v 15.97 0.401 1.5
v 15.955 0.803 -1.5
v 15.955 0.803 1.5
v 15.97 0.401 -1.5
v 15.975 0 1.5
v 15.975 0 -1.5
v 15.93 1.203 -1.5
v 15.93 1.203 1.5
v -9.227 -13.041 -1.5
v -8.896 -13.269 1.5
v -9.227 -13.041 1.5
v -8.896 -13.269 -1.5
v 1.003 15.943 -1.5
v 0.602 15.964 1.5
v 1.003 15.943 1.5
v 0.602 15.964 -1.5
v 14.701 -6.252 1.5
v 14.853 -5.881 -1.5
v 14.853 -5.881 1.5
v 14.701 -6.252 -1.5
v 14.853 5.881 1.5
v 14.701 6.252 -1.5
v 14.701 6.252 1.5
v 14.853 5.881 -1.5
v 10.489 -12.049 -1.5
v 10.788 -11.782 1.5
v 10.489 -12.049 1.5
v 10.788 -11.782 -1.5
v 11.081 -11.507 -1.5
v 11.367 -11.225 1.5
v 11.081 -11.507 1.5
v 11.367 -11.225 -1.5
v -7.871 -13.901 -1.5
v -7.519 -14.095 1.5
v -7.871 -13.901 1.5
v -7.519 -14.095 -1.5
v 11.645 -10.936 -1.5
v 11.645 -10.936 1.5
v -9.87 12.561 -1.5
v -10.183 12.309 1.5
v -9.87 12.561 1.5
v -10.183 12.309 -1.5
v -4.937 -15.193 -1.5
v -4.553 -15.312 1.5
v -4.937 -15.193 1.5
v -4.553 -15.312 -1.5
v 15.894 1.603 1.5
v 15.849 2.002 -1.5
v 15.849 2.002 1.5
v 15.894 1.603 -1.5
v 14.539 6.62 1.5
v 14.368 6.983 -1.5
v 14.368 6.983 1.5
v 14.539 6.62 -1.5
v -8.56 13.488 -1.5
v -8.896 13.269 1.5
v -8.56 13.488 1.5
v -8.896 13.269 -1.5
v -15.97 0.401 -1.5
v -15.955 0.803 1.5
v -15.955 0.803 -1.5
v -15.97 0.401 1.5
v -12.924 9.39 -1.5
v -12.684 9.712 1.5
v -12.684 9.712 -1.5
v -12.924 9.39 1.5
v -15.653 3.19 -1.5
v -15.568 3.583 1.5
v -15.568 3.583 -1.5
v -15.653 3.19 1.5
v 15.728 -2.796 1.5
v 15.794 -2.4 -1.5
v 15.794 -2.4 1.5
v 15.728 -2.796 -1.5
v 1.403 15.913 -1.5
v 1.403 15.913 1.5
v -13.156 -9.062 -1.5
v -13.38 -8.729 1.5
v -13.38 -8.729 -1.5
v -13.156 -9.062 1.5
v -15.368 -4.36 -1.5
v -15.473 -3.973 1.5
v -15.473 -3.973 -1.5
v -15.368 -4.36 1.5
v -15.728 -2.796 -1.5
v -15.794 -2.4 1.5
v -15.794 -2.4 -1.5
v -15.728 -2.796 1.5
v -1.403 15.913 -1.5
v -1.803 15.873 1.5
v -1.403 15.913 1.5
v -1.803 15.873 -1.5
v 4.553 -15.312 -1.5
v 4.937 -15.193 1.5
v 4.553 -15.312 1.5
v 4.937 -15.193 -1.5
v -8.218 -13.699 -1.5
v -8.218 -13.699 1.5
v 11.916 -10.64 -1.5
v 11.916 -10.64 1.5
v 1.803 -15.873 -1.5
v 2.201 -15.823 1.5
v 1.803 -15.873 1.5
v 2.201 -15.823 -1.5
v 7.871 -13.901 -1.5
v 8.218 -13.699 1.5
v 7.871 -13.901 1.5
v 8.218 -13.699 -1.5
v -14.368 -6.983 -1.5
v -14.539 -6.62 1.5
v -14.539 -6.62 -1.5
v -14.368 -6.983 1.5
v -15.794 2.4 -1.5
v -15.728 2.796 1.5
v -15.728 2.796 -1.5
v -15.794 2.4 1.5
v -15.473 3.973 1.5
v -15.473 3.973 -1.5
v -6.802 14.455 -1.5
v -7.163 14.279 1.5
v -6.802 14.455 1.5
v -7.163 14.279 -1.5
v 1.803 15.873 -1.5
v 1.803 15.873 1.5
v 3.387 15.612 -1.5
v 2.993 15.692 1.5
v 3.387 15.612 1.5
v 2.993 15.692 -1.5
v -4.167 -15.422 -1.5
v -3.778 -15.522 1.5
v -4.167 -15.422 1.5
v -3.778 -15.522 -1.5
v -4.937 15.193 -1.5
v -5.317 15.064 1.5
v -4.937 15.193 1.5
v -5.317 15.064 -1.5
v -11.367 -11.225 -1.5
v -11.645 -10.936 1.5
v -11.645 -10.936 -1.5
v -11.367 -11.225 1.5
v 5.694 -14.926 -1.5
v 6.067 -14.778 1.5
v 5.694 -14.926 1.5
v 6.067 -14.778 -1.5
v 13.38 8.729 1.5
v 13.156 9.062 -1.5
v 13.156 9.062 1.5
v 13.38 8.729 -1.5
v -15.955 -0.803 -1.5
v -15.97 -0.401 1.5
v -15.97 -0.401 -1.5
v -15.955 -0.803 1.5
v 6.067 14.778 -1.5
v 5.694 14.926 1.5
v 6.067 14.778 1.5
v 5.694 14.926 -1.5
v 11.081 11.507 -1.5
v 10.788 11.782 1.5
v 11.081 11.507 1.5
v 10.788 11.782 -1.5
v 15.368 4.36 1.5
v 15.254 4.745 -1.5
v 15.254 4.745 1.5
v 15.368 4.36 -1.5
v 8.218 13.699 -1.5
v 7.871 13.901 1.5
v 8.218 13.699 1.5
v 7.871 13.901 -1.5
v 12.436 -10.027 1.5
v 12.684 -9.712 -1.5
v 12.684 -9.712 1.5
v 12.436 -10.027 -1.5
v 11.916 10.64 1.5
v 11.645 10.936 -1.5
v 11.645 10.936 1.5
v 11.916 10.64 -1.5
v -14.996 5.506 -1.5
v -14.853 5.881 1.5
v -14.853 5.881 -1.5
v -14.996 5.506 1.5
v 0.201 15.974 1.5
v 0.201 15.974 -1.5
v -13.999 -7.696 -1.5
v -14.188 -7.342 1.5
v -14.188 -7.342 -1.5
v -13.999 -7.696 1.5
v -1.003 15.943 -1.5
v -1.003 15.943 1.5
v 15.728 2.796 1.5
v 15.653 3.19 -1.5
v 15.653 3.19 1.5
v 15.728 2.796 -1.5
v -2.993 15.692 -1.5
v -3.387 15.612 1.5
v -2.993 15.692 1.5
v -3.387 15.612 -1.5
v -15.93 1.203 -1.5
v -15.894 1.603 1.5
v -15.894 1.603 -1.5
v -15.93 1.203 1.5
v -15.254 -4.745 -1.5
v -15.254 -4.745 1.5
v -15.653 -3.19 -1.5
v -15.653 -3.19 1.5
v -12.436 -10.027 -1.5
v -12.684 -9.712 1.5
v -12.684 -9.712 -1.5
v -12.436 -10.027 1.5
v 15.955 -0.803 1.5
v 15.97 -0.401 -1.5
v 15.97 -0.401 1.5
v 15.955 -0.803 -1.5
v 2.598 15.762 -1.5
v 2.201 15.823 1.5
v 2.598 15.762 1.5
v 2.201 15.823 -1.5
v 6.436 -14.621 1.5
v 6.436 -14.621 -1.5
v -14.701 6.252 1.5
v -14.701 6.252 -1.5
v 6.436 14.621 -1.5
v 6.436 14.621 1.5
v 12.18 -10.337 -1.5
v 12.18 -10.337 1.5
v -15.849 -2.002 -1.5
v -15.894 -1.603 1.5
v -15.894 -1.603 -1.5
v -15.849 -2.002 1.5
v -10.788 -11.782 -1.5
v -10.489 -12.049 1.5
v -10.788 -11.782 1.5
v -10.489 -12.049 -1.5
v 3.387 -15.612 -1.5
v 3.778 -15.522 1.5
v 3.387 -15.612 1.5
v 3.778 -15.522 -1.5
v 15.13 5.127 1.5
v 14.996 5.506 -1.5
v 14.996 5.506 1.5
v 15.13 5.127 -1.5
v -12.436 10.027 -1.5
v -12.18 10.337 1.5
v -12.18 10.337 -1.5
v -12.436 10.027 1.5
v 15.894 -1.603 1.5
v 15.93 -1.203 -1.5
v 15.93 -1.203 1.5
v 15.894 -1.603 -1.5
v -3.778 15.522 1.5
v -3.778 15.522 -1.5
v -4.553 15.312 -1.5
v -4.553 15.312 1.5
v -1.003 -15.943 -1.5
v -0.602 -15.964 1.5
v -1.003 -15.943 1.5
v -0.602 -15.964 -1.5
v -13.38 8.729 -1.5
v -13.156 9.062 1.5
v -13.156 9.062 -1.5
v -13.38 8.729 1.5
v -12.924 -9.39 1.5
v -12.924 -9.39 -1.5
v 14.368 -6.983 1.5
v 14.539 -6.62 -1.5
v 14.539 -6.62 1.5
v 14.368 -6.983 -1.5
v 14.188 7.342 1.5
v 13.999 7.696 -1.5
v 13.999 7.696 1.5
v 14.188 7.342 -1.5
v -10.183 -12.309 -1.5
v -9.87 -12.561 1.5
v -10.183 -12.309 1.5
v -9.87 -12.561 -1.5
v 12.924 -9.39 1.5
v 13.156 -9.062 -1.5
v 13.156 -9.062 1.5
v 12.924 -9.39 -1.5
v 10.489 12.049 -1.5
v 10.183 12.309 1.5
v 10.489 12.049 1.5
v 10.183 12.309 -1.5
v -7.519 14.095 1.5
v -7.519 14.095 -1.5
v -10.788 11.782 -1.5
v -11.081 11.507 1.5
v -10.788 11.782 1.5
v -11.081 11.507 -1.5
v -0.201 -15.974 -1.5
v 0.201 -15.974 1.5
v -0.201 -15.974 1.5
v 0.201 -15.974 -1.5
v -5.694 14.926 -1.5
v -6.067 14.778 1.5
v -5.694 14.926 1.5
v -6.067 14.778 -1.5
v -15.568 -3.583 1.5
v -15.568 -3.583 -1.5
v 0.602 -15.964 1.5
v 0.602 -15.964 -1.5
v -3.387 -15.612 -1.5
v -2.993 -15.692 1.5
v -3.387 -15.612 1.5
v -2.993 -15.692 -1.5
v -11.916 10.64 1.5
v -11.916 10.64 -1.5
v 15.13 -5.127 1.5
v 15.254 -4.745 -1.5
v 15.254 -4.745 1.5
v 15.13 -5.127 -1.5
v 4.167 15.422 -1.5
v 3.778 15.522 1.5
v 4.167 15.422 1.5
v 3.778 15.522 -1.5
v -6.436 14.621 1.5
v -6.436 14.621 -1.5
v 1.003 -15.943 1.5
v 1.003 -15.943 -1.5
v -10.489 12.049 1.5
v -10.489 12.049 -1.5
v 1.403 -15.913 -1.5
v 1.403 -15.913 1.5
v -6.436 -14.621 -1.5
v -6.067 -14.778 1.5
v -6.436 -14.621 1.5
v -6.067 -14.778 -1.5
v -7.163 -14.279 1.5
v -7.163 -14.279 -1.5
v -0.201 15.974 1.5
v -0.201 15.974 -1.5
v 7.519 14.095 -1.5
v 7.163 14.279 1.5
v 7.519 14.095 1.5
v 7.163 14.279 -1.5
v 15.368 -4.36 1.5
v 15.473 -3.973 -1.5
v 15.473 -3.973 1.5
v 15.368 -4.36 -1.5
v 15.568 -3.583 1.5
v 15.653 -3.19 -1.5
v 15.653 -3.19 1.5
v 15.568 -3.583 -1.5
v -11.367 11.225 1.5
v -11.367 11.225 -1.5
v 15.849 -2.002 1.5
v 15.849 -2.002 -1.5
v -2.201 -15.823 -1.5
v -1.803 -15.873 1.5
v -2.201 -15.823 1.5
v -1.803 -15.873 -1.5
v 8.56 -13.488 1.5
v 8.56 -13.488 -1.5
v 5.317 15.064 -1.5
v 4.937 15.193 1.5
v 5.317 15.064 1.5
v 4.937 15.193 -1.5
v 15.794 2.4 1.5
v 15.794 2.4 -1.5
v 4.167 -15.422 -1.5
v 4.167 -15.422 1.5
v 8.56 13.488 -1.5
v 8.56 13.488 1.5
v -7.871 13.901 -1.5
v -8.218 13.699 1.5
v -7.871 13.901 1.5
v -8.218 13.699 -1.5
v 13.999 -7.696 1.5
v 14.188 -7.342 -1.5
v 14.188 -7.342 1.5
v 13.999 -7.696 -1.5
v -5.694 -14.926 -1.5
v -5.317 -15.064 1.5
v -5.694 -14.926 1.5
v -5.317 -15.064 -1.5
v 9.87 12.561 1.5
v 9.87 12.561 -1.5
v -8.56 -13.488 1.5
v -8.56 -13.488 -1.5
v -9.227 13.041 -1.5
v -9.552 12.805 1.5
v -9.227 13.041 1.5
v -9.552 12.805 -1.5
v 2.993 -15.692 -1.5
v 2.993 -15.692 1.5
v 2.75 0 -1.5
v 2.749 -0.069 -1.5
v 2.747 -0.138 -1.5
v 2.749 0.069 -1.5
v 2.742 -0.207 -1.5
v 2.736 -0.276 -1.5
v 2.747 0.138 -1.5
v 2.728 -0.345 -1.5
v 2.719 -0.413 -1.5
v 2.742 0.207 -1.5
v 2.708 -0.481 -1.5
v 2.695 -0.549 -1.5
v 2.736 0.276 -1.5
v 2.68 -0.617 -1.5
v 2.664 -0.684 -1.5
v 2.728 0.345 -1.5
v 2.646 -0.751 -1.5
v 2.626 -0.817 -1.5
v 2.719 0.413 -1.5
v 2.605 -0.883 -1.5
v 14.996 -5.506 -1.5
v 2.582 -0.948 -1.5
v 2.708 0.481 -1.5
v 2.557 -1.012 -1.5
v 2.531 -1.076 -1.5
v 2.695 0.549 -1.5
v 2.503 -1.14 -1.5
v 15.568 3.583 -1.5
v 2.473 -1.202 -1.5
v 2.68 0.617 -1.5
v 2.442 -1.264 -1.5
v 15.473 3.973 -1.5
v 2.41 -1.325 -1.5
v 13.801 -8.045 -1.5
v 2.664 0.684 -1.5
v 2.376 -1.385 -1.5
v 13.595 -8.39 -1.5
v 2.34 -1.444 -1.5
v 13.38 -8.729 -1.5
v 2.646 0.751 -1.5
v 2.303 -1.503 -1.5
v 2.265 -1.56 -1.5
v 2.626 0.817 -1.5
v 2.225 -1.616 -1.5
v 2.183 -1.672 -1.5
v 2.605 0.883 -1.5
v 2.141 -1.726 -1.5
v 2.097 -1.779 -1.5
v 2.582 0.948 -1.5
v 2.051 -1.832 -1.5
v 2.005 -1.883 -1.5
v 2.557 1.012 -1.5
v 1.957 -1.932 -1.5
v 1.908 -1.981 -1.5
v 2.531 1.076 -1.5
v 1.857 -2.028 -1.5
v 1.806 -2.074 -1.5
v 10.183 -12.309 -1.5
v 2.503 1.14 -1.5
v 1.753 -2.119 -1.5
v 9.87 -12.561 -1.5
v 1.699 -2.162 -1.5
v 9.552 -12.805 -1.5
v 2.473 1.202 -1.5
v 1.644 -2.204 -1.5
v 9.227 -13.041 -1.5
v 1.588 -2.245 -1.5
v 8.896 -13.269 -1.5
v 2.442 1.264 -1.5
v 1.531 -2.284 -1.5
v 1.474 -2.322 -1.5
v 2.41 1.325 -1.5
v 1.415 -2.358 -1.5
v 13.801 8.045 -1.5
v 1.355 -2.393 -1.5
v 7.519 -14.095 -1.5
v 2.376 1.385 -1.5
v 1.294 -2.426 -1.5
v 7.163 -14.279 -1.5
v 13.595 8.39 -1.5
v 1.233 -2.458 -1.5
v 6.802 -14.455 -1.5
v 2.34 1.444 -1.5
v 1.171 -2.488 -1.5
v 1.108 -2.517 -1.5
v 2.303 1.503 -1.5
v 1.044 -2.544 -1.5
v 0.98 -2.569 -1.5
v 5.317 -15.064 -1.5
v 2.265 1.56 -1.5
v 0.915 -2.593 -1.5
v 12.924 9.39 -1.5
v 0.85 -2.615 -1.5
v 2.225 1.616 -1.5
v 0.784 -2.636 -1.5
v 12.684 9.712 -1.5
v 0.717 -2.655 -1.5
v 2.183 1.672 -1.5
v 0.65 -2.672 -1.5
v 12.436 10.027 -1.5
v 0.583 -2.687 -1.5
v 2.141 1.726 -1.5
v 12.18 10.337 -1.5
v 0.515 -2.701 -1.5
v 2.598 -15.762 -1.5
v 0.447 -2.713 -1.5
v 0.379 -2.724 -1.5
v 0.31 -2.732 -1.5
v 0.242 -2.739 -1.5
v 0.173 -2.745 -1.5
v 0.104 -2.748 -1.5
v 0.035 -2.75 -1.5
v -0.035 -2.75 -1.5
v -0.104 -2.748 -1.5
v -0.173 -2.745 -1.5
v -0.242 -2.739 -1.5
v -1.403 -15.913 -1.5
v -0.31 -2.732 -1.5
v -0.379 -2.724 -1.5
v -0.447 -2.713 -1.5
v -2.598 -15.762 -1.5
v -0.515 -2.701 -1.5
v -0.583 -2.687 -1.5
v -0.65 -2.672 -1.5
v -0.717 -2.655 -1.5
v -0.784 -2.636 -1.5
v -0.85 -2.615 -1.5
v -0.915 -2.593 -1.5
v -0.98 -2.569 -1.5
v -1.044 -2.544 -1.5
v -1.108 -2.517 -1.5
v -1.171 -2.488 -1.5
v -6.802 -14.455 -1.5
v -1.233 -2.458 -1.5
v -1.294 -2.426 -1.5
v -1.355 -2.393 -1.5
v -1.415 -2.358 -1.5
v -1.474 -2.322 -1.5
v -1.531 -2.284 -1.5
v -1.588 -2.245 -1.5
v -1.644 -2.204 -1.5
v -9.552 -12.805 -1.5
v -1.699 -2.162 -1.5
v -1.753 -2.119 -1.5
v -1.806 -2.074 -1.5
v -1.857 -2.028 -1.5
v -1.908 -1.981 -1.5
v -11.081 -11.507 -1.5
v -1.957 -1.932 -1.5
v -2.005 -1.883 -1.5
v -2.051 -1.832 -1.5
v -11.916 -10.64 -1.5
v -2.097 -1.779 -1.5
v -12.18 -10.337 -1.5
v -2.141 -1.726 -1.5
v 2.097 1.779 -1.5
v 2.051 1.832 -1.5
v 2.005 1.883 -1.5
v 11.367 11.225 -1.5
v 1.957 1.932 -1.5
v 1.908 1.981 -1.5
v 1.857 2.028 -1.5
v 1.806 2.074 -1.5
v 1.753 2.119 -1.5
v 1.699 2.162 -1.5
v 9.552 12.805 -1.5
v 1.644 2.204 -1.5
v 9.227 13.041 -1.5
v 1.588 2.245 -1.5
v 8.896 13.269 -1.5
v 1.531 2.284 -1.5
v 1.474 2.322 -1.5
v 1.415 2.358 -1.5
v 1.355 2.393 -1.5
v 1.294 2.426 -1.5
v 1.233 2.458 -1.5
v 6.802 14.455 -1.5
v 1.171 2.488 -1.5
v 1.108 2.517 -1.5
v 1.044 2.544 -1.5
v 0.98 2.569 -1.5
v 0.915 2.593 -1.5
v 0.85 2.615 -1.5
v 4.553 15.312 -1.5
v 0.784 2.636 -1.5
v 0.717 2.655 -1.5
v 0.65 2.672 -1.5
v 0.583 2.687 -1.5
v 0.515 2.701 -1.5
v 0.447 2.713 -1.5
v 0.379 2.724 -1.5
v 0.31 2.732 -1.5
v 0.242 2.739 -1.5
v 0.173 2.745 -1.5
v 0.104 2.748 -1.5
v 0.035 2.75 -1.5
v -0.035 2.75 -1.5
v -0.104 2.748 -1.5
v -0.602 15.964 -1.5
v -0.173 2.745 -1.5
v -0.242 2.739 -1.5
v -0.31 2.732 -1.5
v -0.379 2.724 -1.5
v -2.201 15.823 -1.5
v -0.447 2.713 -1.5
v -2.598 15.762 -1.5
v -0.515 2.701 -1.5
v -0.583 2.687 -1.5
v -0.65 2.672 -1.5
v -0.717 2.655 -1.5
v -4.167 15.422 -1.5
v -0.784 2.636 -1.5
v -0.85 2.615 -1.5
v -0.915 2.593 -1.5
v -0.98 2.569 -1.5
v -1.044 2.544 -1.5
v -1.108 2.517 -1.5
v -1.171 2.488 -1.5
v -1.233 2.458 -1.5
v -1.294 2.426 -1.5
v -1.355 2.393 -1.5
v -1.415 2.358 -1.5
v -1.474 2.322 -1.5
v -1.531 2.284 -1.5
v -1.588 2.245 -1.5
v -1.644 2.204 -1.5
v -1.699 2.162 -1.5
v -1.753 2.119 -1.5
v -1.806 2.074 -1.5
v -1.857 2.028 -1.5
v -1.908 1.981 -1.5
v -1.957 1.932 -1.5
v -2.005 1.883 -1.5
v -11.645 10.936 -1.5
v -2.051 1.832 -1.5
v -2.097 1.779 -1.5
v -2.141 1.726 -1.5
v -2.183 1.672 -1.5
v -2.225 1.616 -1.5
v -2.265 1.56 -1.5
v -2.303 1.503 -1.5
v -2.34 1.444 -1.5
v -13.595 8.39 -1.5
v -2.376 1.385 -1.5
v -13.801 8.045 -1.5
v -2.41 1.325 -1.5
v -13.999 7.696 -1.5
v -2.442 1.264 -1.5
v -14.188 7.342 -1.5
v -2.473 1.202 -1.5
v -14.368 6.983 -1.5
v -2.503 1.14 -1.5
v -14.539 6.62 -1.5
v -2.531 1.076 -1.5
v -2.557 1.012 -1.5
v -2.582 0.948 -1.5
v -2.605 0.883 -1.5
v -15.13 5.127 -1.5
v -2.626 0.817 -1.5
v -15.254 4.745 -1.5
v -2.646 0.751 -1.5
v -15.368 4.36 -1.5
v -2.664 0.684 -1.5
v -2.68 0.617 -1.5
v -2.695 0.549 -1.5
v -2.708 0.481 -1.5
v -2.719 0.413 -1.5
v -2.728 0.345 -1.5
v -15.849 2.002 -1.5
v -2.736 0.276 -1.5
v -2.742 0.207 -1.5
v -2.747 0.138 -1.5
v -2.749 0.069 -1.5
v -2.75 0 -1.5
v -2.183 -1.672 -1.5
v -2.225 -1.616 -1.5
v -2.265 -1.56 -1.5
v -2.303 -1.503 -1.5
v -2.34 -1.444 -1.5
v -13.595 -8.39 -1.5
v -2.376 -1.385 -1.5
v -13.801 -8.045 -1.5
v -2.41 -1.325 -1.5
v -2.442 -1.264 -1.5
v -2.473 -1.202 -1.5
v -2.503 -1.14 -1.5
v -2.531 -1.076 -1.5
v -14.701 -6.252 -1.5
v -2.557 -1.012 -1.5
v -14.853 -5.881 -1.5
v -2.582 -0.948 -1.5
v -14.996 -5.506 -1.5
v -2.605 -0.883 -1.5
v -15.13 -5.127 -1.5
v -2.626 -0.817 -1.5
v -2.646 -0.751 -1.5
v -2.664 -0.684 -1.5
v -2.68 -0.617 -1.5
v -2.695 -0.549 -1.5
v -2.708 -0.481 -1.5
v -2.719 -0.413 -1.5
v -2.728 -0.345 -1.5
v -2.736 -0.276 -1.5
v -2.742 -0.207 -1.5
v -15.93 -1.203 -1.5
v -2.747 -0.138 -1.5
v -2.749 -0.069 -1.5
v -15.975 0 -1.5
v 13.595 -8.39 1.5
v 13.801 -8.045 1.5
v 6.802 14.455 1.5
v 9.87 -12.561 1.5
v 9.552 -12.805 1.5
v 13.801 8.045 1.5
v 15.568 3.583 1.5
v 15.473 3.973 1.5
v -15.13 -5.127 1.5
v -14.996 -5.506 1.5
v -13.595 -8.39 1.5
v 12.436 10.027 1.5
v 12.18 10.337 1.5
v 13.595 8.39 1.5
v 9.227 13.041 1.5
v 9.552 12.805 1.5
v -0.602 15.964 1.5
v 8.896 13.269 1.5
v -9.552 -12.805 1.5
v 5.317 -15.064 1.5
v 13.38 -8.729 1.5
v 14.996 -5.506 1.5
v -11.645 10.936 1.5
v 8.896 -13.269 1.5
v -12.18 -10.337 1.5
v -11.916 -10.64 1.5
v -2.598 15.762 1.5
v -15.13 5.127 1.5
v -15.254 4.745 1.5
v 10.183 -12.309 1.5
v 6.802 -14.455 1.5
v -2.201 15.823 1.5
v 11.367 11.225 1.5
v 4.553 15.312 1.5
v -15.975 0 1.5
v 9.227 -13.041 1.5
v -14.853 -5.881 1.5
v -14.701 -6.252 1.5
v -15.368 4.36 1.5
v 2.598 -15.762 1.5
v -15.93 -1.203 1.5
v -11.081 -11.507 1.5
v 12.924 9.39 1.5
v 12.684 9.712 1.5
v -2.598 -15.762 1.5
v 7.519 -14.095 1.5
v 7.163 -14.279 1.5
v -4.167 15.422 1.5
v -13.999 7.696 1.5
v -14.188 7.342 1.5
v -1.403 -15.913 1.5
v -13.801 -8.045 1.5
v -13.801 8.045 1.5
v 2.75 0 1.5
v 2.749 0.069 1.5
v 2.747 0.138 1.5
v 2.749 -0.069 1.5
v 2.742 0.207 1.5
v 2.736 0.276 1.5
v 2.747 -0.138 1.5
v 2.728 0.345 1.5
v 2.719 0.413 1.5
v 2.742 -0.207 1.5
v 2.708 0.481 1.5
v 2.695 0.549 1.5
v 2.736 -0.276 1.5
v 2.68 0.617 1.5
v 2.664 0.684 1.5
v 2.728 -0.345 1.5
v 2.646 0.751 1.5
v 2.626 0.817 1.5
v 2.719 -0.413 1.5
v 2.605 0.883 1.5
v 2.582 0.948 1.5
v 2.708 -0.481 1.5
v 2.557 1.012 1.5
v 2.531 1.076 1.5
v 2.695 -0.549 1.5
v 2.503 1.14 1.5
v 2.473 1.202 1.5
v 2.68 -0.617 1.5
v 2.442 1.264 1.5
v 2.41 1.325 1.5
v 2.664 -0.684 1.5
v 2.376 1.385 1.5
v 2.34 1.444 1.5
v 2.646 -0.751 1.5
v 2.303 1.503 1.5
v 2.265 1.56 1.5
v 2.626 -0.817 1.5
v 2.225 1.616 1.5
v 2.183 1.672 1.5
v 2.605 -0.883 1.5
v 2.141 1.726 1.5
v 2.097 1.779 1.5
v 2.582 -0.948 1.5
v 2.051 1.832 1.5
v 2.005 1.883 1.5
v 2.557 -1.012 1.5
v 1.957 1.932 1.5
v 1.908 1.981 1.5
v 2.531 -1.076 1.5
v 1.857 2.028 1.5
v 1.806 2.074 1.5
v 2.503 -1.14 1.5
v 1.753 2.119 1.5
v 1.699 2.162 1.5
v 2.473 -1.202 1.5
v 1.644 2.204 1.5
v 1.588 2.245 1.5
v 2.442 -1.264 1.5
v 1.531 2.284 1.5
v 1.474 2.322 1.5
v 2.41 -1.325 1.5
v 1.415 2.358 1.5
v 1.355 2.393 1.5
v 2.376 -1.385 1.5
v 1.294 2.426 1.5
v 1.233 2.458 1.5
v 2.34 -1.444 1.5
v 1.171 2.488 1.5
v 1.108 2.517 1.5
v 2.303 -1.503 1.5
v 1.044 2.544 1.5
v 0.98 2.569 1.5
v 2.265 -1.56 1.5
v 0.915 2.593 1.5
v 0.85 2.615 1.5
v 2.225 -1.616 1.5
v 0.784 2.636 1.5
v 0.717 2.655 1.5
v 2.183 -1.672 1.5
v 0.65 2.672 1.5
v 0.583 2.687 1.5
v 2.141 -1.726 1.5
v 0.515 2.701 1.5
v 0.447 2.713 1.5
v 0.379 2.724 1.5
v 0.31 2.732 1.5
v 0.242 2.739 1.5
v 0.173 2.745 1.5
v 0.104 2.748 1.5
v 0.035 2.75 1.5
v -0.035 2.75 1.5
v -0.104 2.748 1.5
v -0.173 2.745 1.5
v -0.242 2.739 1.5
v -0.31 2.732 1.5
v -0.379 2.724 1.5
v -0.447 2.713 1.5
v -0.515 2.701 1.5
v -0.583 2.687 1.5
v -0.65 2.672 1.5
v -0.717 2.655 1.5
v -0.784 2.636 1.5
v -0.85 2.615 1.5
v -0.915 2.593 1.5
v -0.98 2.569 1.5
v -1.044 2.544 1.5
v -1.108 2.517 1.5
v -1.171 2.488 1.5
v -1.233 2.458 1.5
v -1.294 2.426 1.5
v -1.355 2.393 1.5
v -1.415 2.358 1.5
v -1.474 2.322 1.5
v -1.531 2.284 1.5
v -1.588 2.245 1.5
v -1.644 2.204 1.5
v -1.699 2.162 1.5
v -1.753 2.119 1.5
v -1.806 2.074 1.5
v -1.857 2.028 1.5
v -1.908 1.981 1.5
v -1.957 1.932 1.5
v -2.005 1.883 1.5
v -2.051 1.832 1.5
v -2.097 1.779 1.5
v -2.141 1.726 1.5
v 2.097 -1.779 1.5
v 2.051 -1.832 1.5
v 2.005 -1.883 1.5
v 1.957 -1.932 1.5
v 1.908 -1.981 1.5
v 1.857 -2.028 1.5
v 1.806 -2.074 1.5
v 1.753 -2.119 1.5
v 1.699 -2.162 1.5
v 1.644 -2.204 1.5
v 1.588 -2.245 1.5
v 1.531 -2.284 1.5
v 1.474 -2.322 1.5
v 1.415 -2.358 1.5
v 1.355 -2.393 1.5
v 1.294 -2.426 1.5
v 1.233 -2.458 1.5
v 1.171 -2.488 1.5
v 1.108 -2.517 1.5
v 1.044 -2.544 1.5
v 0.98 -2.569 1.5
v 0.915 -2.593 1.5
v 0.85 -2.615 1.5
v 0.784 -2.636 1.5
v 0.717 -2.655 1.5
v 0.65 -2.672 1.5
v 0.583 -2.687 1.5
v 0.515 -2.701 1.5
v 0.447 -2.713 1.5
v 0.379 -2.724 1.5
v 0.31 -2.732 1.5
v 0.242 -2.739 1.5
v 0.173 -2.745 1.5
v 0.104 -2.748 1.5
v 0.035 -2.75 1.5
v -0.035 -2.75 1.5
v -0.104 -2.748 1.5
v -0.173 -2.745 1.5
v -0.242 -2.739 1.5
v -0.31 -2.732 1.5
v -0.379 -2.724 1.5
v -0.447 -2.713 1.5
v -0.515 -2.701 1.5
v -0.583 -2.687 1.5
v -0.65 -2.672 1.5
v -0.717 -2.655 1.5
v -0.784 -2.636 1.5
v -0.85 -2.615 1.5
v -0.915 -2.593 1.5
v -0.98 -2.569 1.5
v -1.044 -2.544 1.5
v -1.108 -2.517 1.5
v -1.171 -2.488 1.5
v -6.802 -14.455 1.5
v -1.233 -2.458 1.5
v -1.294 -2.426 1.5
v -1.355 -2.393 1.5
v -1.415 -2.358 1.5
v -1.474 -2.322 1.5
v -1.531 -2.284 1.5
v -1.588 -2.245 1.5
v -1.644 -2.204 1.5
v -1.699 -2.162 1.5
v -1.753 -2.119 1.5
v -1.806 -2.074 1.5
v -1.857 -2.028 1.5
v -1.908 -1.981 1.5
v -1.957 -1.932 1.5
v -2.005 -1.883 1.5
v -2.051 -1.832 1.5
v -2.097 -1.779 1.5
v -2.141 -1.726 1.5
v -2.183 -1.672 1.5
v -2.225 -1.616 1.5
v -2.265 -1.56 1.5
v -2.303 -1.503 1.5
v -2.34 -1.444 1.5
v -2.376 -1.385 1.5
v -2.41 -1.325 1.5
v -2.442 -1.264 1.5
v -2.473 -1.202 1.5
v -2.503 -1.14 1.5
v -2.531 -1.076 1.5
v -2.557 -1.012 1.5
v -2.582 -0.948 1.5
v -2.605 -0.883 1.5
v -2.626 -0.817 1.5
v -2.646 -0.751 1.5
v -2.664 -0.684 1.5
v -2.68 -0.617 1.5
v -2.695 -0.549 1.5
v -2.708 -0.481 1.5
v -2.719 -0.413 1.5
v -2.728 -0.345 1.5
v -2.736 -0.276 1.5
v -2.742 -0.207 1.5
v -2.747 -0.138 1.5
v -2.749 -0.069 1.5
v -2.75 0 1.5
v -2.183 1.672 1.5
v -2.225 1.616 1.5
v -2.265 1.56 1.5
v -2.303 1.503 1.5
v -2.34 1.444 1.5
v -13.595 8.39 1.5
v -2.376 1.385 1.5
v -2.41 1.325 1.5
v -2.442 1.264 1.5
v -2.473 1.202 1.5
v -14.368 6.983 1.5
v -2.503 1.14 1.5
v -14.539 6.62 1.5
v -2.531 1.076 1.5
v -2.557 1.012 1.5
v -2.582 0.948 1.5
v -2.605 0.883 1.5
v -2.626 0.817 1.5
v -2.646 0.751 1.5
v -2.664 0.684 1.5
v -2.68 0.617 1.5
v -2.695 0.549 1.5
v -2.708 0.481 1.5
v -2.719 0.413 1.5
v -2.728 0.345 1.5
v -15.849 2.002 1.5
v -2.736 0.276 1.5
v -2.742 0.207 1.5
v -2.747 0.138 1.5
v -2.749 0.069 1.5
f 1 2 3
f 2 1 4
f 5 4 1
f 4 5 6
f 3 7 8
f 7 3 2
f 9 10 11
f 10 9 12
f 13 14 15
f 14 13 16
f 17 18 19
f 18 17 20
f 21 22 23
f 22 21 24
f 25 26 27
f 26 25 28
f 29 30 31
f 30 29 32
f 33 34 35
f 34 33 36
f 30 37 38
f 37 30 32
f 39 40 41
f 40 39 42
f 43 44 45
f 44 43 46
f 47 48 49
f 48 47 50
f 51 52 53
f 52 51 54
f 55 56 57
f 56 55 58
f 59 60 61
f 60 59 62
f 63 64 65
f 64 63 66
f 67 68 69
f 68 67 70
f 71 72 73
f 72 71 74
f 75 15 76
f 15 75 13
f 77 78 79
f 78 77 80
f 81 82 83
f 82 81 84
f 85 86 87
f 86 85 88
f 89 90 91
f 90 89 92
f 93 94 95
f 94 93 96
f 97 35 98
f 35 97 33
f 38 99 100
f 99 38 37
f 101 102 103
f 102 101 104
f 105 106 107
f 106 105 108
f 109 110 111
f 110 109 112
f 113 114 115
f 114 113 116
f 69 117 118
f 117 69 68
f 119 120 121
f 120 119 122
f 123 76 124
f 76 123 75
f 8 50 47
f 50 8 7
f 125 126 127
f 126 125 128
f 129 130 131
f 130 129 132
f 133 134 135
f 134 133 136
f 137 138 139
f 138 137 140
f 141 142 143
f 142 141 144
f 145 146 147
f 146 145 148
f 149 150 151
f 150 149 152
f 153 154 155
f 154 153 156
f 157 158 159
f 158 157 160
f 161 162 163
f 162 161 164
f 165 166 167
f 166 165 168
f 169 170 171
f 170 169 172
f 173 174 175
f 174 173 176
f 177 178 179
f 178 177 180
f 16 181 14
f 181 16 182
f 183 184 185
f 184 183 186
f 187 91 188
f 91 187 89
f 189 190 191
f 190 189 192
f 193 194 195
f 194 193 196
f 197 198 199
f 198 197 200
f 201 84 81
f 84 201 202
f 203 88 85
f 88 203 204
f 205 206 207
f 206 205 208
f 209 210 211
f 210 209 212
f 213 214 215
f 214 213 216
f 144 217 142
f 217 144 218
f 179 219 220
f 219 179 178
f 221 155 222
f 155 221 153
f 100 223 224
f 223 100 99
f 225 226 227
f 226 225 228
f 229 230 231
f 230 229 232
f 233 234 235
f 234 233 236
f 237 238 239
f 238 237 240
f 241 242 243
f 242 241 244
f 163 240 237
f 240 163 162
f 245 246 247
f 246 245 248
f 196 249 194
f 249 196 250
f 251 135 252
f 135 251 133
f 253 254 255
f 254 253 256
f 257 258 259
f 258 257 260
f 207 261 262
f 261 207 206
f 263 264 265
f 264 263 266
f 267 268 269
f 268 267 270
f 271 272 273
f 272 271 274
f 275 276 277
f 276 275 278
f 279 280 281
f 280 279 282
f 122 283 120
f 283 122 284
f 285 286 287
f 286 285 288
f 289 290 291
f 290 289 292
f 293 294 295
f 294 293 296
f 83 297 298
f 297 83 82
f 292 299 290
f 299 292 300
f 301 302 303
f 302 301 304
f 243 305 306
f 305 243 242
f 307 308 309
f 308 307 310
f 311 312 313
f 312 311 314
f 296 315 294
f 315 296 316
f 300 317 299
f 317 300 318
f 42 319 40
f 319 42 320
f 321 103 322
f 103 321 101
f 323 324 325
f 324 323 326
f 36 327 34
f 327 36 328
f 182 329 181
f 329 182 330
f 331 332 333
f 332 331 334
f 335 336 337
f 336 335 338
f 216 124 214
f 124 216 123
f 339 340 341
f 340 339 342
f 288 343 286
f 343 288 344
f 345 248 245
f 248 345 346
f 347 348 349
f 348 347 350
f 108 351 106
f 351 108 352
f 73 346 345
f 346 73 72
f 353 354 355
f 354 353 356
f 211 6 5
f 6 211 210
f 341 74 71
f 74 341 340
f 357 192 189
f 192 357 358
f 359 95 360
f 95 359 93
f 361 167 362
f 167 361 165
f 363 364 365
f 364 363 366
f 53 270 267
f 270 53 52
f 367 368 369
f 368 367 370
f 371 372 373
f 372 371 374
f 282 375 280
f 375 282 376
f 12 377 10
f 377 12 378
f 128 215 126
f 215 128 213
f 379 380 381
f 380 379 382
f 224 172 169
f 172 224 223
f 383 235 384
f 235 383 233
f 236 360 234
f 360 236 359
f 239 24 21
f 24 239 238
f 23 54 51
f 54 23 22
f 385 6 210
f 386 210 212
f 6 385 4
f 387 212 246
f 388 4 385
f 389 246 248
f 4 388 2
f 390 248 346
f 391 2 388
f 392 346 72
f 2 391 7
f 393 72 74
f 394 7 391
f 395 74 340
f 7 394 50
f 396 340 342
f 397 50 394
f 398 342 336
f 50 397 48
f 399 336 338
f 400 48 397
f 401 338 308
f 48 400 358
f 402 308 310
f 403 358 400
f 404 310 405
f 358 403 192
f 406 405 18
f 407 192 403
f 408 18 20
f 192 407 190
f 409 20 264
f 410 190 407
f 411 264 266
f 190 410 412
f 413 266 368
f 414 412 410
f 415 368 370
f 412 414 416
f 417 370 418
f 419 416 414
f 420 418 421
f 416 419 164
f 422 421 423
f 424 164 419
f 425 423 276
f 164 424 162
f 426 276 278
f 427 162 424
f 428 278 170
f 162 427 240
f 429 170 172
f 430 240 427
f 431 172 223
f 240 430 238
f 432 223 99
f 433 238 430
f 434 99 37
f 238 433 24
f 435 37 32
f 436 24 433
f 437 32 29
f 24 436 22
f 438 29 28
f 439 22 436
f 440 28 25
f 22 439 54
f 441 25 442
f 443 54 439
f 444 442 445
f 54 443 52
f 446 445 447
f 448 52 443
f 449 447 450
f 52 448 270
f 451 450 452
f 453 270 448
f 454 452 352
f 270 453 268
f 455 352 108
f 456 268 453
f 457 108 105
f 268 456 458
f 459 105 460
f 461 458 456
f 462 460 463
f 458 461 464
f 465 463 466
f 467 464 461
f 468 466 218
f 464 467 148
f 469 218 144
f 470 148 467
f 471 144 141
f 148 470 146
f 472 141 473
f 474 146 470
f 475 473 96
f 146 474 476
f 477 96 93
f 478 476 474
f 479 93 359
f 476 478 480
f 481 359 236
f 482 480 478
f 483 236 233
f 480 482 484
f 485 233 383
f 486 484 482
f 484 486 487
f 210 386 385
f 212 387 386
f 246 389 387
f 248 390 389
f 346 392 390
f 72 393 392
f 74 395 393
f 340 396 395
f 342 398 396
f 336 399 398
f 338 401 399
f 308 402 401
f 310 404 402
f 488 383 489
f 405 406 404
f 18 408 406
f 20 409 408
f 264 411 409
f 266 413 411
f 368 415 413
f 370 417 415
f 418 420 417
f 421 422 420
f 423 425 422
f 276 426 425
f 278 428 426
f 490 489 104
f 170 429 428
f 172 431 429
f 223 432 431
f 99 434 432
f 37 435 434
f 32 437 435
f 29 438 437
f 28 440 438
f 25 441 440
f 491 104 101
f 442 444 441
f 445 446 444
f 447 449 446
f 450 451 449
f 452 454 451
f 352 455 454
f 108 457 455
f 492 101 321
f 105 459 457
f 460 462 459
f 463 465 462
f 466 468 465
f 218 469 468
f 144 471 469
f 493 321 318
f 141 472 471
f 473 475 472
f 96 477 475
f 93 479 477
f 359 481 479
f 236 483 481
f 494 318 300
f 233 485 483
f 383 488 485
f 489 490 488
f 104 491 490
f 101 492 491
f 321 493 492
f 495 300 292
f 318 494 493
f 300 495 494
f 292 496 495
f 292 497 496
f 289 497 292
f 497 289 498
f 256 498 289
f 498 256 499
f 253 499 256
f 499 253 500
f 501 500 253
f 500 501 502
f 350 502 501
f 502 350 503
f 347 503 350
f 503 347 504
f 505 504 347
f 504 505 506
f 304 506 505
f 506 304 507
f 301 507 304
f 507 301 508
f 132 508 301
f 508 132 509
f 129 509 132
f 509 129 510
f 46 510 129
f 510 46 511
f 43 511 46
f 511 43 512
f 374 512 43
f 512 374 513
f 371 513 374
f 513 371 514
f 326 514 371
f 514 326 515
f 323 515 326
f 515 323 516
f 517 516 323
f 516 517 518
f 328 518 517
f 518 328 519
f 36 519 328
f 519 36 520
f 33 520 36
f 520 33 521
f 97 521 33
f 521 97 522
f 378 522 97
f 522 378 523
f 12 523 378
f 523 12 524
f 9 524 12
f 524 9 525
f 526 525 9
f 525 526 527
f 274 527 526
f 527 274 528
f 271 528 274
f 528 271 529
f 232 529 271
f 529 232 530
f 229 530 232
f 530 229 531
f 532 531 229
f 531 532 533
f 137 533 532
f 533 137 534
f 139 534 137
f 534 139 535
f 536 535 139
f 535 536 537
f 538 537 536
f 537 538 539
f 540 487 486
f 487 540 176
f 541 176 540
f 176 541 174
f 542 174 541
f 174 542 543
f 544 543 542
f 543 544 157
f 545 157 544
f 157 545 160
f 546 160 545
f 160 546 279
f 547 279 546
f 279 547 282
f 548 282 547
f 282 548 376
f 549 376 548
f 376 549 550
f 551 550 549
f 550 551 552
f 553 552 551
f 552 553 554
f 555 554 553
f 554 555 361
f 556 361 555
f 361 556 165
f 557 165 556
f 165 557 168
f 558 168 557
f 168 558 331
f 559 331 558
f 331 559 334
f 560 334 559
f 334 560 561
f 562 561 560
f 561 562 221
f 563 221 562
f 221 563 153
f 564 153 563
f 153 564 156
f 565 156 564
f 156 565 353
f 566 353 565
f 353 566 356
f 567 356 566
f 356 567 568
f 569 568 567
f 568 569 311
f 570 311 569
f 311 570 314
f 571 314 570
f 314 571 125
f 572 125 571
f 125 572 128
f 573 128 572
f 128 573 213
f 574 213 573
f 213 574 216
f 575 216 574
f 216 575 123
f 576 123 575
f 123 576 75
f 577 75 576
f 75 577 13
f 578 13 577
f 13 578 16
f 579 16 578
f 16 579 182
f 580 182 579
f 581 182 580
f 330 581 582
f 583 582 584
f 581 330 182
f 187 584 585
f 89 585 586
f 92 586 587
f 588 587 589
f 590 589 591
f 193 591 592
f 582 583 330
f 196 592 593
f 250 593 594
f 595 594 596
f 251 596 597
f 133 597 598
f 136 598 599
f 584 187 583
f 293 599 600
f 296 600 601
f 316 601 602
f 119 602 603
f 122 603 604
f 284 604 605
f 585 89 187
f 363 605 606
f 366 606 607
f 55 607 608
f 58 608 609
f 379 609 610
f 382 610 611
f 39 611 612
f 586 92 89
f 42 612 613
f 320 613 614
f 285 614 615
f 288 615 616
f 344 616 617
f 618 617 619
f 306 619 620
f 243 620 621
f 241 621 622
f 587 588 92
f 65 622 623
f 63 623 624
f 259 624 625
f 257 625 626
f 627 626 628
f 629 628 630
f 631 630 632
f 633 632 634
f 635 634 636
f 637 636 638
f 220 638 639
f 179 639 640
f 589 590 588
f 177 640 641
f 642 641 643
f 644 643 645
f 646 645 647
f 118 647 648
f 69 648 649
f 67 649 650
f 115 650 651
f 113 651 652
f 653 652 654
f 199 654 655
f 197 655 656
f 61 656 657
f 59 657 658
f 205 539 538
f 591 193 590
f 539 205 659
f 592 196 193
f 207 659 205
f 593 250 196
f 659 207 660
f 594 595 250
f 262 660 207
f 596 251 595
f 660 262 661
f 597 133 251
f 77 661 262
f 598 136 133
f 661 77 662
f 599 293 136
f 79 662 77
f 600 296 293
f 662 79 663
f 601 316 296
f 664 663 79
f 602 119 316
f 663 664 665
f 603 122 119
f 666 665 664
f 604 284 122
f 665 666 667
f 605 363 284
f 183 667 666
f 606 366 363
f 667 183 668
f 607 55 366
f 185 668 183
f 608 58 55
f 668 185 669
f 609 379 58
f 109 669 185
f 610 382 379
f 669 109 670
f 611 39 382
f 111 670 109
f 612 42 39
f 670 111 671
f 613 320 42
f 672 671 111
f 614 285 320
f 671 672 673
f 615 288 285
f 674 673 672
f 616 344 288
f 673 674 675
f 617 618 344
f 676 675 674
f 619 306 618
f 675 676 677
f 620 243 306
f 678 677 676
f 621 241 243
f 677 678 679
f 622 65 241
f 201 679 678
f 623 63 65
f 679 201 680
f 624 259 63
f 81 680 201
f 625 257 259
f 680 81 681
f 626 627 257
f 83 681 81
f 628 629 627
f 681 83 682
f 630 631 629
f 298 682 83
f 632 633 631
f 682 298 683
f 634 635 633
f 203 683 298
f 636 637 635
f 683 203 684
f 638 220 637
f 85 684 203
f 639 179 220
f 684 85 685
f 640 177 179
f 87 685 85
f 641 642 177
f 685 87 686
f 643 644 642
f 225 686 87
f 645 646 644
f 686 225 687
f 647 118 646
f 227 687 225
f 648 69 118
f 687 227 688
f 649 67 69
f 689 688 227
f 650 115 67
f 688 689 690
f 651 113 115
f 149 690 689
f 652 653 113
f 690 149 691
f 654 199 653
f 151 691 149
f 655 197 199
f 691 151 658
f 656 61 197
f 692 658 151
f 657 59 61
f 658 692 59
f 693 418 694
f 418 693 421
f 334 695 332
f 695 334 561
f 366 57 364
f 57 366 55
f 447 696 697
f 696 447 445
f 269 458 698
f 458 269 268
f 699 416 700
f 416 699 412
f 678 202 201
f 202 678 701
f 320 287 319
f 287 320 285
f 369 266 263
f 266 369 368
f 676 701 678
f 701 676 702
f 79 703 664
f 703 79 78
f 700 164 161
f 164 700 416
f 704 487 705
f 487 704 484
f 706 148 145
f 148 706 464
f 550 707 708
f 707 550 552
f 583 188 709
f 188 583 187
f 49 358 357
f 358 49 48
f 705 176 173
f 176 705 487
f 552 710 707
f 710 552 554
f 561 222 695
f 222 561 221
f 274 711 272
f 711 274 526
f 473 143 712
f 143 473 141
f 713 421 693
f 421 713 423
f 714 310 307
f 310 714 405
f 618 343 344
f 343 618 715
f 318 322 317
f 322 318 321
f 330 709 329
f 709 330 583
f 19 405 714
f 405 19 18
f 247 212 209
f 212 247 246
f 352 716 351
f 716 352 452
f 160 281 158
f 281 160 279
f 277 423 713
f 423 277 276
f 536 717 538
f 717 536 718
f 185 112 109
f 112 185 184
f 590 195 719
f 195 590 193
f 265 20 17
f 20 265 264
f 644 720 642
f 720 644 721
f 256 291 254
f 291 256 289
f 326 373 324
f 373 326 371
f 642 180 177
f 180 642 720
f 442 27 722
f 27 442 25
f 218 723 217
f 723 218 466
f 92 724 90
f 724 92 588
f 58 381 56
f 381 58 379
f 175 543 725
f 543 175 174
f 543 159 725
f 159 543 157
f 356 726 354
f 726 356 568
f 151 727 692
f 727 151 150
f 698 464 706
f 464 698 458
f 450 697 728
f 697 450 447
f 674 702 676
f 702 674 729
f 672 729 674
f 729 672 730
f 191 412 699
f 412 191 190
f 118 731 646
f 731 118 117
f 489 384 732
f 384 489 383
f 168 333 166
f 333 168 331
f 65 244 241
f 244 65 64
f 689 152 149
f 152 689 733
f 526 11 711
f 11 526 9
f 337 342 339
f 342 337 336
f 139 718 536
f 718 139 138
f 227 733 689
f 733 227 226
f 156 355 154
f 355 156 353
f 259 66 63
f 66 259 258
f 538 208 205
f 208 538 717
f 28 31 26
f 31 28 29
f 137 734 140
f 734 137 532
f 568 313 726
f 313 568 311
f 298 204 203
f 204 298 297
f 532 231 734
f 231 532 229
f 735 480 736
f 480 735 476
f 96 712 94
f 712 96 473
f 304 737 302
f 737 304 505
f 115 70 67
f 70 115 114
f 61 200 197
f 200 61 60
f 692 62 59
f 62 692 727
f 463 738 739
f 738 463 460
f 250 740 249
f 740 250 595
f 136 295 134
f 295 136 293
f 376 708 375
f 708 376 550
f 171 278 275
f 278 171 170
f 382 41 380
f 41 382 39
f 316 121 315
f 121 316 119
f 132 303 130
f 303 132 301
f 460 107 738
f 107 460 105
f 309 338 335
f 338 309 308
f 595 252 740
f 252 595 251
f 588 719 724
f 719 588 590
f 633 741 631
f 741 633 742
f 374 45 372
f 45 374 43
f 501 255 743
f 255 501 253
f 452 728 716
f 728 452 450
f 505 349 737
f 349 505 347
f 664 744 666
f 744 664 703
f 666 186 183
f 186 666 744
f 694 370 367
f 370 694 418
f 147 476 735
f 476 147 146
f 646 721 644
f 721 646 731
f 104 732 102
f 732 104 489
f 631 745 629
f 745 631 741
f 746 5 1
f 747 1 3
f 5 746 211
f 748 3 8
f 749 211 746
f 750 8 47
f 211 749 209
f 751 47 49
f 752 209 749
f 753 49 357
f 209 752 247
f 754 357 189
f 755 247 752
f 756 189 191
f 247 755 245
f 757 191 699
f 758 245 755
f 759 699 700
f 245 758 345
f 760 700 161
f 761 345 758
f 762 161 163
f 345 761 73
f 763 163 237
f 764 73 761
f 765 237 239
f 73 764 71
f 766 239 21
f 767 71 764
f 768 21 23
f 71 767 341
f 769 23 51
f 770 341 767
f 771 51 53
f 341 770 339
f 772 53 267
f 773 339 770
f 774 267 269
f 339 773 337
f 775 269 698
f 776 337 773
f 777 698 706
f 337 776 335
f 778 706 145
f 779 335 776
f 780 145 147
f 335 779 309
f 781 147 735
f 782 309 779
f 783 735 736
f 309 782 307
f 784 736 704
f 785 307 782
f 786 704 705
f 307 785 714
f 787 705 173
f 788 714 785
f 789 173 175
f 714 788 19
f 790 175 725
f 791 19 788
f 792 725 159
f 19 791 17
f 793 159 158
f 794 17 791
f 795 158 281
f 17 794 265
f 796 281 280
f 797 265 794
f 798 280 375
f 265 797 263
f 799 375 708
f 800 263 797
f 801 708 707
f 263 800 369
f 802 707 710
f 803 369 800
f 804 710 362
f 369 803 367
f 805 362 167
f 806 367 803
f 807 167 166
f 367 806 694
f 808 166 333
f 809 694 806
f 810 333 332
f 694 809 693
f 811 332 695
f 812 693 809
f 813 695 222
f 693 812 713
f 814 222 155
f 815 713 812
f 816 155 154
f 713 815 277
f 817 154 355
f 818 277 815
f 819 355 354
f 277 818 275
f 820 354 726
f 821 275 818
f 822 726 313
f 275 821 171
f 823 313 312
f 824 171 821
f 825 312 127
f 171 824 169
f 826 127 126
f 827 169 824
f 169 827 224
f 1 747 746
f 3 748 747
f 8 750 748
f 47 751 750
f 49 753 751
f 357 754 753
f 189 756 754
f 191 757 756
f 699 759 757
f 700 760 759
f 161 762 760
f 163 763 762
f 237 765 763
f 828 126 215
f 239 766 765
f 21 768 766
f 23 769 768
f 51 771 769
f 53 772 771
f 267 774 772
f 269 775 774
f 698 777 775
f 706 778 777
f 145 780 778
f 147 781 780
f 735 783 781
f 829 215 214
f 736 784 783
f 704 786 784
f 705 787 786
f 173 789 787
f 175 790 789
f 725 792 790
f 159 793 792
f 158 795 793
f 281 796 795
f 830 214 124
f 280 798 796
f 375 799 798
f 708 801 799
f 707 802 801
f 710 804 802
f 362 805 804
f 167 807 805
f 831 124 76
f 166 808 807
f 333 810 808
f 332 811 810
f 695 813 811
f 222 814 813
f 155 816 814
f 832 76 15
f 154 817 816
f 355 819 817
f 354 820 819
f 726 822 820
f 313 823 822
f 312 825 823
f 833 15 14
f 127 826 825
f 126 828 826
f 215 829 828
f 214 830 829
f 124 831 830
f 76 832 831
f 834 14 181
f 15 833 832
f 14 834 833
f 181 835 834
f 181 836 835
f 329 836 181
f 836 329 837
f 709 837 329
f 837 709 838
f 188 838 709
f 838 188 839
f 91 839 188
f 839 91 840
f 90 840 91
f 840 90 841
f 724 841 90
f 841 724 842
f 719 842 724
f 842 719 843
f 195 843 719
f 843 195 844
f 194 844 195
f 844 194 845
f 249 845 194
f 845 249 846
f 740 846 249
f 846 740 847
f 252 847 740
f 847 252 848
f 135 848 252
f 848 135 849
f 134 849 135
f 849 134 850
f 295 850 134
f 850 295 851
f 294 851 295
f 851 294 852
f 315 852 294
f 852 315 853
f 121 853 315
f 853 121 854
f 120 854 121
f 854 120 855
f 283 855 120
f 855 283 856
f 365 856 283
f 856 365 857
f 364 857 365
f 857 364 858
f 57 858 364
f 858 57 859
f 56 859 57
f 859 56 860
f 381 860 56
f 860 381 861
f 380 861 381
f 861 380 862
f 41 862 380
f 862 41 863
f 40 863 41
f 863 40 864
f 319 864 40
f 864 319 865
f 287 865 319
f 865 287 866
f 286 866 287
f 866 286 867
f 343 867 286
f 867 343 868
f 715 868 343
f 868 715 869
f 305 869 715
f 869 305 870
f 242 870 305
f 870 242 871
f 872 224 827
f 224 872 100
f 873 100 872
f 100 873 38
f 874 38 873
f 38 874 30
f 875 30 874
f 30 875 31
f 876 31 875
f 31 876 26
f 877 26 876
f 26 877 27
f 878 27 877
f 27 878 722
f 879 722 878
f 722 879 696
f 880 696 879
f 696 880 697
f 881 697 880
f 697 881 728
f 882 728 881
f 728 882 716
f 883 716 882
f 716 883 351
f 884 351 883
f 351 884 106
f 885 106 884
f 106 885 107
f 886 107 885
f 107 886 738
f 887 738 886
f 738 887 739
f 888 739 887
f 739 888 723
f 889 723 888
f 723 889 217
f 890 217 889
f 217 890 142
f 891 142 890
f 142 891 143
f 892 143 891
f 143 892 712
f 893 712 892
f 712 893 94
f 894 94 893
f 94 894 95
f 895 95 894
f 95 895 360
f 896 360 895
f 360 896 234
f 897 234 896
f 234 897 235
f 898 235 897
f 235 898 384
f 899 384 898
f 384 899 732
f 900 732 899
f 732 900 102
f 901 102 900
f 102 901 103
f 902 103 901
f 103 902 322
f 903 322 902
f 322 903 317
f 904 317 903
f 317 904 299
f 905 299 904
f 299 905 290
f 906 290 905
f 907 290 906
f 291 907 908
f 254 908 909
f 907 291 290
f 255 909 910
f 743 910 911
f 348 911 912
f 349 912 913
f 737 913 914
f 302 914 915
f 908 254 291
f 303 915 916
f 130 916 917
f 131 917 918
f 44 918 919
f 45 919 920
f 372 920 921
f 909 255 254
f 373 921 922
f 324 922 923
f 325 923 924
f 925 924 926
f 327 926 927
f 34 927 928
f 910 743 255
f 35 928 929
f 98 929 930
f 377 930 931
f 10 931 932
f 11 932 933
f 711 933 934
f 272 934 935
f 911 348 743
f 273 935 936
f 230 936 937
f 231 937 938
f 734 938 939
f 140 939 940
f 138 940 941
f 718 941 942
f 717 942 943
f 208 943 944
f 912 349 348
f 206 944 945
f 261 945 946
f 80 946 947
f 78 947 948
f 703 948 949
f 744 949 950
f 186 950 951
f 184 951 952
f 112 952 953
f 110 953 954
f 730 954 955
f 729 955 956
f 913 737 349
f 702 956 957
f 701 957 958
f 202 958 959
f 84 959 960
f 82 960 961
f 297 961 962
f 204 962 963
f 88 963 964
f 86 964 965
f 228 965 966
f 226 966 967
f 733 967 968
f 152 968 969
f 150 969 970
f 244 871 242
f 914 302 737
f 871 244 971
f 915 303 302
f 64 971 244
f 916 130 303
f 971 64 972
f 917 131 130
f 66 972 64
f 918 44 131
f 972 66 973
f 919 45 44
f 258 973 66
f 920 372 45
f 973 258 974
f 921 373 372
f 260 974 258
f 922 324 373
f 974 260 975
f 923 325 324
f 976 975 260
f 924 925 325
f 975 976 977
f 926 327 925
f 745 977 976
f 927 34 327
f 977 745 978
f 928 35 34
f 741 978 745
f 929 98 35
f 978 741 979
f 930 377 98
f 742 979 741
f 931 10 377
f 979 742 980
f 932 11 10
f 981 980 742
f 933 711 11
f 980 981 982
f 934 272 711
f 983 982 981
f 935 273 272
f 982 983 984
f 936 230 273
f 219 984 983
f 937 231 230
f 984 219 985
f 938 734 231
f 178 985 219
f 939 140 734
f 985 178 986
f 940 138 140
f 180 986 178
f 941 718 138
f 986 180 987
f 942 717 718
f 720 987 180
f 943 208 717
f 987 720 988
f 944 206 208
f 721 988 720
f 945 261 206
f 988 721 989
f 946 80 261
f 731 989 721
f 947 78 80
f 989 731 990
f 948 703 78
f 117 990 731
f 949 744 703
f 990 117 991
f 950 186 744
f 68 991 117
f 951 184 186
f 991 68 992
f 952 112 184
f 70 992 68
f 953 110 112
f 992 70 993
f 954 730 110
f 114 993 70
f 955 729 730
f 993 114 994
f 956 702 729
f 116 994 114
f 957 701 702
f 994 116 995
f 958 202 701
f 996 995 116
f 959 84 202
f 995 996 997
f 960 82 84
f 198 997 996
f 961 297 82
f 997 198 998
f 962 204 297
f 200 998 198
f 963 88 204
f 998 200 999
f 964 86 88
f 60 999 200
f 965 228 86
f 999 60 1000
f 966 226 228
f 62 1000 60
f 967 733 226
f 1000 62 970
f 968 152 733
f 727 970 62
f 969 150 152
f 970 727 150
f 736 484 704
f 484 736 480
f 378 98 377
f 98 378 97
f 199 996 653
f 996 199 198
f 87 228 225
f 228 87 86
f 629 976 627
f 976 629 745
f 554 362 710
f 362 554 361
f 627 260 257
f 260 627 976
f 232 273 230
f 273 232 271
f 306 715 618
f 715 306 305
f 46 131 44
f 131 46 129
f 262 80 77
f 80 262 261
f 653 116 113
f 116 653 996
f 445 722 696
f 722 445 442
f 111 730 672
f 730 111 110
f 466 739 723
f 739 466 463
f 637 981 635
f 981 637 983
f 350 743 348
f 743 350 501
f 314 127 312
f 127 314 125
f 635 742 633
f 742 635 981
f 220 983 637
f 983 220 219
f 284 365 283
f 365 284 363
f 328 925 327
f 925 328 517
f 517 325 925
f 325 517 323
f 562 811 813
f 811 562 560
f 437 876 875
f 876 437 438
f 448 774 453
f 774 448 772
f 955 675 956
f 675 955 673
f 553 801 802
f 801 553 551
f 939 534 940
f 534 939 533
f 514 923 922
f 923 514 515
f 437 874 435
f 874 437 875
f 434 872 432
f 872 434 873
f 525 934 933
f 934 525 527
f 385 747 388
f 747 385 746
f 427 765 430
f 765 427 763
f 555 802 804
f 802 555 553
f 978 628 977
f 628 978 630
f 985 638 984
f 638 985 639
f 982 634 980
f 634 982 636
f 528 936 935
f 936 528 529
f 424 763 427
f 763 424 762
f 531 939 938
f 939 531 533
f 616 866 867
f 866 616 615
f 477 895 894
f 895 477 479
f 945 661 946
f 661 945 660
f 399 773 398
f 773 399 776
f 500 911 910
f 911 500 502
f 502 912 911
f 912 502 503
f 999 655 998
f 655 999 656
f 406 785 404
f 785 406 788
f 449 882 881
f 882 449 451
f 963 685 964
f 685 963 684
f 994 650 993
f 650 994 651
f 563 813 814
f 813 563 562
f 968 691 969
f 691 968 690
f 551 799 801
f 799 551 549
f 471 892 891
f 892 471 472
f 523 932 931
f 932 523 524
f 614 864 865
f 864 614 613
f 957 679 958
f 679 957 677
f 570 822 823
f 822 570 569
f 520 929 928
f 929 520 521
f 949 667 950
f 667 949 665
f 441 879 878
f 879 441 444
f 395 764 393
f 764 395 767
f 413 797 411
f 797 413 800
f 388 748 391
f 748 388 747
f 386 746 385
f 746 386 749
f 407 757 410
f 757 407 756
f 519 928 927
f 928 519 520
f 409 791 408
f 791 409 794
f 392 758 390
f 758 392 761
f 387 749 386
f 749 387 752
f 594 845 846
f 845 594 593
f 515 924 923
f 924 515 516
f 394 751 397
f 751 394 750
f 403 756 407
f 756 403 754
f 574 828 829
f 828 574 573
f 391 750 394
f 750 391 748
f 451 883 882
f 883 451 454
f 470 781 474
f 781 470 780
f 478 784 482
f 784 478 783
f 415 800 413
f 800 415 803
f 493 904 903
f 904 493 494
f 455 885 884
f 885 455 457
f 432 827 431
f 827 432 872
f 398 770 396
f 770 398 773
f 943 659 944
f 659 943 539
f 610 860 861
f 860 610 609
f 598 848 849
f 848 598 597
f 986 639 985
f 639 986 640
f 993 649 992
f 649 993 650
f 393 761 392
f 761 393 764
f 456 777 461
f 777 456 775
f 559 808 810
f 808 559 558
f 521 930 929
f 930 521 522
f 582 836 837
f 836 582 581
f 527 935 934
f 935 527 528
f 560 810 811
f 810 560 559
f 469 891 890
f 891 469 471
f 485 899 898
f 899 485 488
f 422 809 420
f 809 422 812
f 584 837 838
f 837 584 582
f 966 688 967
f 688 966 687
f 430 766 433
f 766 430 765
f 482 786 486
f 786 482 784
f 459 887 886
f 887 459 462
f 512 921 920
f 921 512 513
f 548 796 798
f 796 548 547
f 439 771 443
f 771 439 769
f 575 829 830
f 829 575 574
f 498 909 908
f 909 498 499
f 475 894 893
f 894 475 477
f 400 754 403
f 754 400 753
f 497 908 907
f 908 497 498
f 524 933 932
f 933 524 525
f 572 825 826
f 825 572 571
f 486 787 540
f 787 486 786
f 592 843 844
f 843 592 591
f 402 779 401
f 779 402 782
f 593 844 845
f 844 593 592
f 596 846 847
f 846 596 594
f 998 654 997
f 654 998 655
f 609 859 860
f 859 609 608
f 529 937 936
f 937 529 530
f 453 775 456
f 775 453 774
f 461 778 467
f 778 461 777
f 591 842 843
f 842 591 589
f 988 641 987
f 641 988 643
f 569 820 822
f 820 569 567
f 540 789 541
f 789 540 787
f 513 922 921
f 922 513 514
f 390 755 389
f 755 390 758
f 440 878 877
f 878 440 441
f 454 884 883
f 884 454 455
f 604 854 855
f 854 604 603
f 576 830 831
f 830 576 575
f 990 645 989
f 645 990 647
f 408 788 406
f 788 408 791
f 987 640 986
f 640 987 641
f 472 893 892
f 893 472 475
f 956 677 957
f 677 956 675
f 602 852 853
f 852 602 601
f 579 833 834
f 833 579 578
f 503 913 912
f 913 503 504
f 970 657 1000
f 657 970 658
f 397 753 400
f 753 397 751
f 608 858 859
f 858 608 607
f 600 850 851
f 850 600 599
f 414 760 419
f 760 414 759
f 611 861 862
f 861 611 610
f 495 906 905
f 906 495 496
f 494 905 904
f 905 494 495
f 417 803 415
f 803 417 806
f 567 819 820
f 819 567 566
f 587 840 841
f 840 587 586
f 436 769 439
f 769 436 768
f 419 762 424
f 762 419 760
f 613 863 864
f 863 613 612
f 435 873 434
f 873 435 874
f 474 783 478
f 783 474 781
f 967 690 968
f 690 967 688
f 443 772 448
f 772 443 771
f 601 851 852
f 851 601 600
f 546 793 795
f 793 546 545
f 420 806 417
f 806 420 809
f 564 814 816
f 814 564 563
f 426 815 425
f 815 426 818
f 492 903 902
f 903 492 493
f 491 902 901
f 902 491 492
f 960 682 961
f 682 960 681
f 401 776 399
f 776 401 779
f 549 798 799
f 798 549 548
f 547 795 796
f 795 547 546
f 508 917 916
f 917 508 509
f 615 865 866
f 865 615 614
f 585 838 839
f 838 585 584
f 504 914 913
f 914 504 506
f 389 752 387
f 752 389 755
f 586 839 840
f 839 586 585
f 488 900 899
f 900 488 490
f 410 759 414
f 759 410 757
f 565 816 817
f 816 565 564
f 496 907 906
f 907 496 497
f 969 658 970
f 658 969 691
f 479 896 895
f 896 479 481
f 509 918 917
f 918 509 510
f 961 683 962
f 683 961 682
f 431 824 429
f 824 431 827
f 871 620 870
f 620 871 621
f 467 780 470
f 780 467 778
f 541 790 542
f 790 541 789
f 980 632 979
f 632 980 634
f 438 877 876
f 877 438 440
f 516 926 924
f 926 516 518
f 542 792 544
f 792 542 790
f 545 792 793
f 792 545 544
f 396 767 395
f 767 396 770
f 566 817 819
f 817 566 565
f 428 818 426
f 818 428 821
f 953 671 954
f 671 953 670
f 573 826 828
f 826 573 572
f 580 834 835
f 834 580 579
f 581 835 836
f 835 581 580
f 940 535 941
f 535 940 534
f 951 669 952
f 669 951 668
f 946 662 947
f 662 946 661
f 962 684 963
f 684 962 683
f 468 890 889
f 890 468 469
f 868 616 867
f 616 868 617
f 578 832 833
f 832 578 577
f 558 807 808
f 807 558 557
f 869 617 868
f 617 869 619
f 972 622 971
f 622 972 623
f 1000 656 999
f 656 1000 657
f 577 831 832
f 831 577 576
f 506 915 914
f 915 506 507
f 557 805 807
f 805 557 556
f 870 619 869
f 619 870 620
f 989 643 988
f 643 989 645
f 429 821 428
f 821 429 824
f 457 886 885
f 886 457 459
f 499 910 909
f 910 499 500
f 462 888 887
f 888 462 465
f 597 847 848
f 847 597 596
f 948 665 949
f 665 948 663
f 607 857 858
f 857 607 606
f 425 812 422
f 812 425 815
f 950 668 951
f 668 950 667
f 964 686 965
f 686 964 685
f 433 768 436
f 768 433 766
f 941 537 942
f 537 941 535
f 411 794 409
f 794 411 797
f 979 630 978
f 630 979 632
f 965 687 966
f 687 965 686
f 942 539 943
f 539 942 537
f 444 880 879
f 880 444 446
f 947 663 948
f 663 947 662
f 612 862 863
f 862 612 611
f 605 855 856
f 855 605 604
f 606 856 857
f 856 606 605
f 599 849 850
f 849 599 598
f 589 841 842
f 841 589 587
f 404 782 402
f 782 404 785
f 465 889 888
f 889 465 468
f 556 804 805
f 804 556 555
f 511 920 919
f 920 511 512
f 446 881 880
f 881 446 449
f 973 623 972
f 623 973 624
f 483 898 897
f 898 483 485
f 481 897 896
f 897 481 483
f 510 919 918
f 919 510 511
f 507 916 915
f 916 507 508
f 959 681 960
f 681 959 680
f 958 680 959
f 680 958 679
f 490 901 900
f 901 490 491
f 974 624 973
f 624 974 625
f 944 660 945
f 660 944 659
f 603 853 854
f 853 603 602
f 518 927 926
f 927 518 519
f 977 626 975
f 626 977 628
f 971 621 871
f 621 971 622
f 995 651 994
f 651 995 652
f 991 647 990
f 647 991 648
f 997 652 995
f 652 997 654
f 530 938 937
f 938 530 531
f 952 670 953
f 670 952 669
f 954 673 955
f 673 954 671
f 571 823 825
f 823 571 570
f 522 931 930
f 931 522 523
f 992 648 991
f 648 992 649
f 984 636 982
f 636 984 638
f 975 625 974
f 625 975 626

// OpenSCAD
$fn = 250;
epsilon = 0.01;
PLATE_DIAMETER = 31.95;
PLATE_WIDTH = 3.0;
HOLE_DIAMETER = 5.5;

difference()
{
    cylinder(r = PLATE_DIAMETER / 2, h = PLATE_WIDTH, center = true);
    cylinder(r = HOLE_DIAMETER / 2, h = PLATE_WIDTH + epsilon, center = true);
}
